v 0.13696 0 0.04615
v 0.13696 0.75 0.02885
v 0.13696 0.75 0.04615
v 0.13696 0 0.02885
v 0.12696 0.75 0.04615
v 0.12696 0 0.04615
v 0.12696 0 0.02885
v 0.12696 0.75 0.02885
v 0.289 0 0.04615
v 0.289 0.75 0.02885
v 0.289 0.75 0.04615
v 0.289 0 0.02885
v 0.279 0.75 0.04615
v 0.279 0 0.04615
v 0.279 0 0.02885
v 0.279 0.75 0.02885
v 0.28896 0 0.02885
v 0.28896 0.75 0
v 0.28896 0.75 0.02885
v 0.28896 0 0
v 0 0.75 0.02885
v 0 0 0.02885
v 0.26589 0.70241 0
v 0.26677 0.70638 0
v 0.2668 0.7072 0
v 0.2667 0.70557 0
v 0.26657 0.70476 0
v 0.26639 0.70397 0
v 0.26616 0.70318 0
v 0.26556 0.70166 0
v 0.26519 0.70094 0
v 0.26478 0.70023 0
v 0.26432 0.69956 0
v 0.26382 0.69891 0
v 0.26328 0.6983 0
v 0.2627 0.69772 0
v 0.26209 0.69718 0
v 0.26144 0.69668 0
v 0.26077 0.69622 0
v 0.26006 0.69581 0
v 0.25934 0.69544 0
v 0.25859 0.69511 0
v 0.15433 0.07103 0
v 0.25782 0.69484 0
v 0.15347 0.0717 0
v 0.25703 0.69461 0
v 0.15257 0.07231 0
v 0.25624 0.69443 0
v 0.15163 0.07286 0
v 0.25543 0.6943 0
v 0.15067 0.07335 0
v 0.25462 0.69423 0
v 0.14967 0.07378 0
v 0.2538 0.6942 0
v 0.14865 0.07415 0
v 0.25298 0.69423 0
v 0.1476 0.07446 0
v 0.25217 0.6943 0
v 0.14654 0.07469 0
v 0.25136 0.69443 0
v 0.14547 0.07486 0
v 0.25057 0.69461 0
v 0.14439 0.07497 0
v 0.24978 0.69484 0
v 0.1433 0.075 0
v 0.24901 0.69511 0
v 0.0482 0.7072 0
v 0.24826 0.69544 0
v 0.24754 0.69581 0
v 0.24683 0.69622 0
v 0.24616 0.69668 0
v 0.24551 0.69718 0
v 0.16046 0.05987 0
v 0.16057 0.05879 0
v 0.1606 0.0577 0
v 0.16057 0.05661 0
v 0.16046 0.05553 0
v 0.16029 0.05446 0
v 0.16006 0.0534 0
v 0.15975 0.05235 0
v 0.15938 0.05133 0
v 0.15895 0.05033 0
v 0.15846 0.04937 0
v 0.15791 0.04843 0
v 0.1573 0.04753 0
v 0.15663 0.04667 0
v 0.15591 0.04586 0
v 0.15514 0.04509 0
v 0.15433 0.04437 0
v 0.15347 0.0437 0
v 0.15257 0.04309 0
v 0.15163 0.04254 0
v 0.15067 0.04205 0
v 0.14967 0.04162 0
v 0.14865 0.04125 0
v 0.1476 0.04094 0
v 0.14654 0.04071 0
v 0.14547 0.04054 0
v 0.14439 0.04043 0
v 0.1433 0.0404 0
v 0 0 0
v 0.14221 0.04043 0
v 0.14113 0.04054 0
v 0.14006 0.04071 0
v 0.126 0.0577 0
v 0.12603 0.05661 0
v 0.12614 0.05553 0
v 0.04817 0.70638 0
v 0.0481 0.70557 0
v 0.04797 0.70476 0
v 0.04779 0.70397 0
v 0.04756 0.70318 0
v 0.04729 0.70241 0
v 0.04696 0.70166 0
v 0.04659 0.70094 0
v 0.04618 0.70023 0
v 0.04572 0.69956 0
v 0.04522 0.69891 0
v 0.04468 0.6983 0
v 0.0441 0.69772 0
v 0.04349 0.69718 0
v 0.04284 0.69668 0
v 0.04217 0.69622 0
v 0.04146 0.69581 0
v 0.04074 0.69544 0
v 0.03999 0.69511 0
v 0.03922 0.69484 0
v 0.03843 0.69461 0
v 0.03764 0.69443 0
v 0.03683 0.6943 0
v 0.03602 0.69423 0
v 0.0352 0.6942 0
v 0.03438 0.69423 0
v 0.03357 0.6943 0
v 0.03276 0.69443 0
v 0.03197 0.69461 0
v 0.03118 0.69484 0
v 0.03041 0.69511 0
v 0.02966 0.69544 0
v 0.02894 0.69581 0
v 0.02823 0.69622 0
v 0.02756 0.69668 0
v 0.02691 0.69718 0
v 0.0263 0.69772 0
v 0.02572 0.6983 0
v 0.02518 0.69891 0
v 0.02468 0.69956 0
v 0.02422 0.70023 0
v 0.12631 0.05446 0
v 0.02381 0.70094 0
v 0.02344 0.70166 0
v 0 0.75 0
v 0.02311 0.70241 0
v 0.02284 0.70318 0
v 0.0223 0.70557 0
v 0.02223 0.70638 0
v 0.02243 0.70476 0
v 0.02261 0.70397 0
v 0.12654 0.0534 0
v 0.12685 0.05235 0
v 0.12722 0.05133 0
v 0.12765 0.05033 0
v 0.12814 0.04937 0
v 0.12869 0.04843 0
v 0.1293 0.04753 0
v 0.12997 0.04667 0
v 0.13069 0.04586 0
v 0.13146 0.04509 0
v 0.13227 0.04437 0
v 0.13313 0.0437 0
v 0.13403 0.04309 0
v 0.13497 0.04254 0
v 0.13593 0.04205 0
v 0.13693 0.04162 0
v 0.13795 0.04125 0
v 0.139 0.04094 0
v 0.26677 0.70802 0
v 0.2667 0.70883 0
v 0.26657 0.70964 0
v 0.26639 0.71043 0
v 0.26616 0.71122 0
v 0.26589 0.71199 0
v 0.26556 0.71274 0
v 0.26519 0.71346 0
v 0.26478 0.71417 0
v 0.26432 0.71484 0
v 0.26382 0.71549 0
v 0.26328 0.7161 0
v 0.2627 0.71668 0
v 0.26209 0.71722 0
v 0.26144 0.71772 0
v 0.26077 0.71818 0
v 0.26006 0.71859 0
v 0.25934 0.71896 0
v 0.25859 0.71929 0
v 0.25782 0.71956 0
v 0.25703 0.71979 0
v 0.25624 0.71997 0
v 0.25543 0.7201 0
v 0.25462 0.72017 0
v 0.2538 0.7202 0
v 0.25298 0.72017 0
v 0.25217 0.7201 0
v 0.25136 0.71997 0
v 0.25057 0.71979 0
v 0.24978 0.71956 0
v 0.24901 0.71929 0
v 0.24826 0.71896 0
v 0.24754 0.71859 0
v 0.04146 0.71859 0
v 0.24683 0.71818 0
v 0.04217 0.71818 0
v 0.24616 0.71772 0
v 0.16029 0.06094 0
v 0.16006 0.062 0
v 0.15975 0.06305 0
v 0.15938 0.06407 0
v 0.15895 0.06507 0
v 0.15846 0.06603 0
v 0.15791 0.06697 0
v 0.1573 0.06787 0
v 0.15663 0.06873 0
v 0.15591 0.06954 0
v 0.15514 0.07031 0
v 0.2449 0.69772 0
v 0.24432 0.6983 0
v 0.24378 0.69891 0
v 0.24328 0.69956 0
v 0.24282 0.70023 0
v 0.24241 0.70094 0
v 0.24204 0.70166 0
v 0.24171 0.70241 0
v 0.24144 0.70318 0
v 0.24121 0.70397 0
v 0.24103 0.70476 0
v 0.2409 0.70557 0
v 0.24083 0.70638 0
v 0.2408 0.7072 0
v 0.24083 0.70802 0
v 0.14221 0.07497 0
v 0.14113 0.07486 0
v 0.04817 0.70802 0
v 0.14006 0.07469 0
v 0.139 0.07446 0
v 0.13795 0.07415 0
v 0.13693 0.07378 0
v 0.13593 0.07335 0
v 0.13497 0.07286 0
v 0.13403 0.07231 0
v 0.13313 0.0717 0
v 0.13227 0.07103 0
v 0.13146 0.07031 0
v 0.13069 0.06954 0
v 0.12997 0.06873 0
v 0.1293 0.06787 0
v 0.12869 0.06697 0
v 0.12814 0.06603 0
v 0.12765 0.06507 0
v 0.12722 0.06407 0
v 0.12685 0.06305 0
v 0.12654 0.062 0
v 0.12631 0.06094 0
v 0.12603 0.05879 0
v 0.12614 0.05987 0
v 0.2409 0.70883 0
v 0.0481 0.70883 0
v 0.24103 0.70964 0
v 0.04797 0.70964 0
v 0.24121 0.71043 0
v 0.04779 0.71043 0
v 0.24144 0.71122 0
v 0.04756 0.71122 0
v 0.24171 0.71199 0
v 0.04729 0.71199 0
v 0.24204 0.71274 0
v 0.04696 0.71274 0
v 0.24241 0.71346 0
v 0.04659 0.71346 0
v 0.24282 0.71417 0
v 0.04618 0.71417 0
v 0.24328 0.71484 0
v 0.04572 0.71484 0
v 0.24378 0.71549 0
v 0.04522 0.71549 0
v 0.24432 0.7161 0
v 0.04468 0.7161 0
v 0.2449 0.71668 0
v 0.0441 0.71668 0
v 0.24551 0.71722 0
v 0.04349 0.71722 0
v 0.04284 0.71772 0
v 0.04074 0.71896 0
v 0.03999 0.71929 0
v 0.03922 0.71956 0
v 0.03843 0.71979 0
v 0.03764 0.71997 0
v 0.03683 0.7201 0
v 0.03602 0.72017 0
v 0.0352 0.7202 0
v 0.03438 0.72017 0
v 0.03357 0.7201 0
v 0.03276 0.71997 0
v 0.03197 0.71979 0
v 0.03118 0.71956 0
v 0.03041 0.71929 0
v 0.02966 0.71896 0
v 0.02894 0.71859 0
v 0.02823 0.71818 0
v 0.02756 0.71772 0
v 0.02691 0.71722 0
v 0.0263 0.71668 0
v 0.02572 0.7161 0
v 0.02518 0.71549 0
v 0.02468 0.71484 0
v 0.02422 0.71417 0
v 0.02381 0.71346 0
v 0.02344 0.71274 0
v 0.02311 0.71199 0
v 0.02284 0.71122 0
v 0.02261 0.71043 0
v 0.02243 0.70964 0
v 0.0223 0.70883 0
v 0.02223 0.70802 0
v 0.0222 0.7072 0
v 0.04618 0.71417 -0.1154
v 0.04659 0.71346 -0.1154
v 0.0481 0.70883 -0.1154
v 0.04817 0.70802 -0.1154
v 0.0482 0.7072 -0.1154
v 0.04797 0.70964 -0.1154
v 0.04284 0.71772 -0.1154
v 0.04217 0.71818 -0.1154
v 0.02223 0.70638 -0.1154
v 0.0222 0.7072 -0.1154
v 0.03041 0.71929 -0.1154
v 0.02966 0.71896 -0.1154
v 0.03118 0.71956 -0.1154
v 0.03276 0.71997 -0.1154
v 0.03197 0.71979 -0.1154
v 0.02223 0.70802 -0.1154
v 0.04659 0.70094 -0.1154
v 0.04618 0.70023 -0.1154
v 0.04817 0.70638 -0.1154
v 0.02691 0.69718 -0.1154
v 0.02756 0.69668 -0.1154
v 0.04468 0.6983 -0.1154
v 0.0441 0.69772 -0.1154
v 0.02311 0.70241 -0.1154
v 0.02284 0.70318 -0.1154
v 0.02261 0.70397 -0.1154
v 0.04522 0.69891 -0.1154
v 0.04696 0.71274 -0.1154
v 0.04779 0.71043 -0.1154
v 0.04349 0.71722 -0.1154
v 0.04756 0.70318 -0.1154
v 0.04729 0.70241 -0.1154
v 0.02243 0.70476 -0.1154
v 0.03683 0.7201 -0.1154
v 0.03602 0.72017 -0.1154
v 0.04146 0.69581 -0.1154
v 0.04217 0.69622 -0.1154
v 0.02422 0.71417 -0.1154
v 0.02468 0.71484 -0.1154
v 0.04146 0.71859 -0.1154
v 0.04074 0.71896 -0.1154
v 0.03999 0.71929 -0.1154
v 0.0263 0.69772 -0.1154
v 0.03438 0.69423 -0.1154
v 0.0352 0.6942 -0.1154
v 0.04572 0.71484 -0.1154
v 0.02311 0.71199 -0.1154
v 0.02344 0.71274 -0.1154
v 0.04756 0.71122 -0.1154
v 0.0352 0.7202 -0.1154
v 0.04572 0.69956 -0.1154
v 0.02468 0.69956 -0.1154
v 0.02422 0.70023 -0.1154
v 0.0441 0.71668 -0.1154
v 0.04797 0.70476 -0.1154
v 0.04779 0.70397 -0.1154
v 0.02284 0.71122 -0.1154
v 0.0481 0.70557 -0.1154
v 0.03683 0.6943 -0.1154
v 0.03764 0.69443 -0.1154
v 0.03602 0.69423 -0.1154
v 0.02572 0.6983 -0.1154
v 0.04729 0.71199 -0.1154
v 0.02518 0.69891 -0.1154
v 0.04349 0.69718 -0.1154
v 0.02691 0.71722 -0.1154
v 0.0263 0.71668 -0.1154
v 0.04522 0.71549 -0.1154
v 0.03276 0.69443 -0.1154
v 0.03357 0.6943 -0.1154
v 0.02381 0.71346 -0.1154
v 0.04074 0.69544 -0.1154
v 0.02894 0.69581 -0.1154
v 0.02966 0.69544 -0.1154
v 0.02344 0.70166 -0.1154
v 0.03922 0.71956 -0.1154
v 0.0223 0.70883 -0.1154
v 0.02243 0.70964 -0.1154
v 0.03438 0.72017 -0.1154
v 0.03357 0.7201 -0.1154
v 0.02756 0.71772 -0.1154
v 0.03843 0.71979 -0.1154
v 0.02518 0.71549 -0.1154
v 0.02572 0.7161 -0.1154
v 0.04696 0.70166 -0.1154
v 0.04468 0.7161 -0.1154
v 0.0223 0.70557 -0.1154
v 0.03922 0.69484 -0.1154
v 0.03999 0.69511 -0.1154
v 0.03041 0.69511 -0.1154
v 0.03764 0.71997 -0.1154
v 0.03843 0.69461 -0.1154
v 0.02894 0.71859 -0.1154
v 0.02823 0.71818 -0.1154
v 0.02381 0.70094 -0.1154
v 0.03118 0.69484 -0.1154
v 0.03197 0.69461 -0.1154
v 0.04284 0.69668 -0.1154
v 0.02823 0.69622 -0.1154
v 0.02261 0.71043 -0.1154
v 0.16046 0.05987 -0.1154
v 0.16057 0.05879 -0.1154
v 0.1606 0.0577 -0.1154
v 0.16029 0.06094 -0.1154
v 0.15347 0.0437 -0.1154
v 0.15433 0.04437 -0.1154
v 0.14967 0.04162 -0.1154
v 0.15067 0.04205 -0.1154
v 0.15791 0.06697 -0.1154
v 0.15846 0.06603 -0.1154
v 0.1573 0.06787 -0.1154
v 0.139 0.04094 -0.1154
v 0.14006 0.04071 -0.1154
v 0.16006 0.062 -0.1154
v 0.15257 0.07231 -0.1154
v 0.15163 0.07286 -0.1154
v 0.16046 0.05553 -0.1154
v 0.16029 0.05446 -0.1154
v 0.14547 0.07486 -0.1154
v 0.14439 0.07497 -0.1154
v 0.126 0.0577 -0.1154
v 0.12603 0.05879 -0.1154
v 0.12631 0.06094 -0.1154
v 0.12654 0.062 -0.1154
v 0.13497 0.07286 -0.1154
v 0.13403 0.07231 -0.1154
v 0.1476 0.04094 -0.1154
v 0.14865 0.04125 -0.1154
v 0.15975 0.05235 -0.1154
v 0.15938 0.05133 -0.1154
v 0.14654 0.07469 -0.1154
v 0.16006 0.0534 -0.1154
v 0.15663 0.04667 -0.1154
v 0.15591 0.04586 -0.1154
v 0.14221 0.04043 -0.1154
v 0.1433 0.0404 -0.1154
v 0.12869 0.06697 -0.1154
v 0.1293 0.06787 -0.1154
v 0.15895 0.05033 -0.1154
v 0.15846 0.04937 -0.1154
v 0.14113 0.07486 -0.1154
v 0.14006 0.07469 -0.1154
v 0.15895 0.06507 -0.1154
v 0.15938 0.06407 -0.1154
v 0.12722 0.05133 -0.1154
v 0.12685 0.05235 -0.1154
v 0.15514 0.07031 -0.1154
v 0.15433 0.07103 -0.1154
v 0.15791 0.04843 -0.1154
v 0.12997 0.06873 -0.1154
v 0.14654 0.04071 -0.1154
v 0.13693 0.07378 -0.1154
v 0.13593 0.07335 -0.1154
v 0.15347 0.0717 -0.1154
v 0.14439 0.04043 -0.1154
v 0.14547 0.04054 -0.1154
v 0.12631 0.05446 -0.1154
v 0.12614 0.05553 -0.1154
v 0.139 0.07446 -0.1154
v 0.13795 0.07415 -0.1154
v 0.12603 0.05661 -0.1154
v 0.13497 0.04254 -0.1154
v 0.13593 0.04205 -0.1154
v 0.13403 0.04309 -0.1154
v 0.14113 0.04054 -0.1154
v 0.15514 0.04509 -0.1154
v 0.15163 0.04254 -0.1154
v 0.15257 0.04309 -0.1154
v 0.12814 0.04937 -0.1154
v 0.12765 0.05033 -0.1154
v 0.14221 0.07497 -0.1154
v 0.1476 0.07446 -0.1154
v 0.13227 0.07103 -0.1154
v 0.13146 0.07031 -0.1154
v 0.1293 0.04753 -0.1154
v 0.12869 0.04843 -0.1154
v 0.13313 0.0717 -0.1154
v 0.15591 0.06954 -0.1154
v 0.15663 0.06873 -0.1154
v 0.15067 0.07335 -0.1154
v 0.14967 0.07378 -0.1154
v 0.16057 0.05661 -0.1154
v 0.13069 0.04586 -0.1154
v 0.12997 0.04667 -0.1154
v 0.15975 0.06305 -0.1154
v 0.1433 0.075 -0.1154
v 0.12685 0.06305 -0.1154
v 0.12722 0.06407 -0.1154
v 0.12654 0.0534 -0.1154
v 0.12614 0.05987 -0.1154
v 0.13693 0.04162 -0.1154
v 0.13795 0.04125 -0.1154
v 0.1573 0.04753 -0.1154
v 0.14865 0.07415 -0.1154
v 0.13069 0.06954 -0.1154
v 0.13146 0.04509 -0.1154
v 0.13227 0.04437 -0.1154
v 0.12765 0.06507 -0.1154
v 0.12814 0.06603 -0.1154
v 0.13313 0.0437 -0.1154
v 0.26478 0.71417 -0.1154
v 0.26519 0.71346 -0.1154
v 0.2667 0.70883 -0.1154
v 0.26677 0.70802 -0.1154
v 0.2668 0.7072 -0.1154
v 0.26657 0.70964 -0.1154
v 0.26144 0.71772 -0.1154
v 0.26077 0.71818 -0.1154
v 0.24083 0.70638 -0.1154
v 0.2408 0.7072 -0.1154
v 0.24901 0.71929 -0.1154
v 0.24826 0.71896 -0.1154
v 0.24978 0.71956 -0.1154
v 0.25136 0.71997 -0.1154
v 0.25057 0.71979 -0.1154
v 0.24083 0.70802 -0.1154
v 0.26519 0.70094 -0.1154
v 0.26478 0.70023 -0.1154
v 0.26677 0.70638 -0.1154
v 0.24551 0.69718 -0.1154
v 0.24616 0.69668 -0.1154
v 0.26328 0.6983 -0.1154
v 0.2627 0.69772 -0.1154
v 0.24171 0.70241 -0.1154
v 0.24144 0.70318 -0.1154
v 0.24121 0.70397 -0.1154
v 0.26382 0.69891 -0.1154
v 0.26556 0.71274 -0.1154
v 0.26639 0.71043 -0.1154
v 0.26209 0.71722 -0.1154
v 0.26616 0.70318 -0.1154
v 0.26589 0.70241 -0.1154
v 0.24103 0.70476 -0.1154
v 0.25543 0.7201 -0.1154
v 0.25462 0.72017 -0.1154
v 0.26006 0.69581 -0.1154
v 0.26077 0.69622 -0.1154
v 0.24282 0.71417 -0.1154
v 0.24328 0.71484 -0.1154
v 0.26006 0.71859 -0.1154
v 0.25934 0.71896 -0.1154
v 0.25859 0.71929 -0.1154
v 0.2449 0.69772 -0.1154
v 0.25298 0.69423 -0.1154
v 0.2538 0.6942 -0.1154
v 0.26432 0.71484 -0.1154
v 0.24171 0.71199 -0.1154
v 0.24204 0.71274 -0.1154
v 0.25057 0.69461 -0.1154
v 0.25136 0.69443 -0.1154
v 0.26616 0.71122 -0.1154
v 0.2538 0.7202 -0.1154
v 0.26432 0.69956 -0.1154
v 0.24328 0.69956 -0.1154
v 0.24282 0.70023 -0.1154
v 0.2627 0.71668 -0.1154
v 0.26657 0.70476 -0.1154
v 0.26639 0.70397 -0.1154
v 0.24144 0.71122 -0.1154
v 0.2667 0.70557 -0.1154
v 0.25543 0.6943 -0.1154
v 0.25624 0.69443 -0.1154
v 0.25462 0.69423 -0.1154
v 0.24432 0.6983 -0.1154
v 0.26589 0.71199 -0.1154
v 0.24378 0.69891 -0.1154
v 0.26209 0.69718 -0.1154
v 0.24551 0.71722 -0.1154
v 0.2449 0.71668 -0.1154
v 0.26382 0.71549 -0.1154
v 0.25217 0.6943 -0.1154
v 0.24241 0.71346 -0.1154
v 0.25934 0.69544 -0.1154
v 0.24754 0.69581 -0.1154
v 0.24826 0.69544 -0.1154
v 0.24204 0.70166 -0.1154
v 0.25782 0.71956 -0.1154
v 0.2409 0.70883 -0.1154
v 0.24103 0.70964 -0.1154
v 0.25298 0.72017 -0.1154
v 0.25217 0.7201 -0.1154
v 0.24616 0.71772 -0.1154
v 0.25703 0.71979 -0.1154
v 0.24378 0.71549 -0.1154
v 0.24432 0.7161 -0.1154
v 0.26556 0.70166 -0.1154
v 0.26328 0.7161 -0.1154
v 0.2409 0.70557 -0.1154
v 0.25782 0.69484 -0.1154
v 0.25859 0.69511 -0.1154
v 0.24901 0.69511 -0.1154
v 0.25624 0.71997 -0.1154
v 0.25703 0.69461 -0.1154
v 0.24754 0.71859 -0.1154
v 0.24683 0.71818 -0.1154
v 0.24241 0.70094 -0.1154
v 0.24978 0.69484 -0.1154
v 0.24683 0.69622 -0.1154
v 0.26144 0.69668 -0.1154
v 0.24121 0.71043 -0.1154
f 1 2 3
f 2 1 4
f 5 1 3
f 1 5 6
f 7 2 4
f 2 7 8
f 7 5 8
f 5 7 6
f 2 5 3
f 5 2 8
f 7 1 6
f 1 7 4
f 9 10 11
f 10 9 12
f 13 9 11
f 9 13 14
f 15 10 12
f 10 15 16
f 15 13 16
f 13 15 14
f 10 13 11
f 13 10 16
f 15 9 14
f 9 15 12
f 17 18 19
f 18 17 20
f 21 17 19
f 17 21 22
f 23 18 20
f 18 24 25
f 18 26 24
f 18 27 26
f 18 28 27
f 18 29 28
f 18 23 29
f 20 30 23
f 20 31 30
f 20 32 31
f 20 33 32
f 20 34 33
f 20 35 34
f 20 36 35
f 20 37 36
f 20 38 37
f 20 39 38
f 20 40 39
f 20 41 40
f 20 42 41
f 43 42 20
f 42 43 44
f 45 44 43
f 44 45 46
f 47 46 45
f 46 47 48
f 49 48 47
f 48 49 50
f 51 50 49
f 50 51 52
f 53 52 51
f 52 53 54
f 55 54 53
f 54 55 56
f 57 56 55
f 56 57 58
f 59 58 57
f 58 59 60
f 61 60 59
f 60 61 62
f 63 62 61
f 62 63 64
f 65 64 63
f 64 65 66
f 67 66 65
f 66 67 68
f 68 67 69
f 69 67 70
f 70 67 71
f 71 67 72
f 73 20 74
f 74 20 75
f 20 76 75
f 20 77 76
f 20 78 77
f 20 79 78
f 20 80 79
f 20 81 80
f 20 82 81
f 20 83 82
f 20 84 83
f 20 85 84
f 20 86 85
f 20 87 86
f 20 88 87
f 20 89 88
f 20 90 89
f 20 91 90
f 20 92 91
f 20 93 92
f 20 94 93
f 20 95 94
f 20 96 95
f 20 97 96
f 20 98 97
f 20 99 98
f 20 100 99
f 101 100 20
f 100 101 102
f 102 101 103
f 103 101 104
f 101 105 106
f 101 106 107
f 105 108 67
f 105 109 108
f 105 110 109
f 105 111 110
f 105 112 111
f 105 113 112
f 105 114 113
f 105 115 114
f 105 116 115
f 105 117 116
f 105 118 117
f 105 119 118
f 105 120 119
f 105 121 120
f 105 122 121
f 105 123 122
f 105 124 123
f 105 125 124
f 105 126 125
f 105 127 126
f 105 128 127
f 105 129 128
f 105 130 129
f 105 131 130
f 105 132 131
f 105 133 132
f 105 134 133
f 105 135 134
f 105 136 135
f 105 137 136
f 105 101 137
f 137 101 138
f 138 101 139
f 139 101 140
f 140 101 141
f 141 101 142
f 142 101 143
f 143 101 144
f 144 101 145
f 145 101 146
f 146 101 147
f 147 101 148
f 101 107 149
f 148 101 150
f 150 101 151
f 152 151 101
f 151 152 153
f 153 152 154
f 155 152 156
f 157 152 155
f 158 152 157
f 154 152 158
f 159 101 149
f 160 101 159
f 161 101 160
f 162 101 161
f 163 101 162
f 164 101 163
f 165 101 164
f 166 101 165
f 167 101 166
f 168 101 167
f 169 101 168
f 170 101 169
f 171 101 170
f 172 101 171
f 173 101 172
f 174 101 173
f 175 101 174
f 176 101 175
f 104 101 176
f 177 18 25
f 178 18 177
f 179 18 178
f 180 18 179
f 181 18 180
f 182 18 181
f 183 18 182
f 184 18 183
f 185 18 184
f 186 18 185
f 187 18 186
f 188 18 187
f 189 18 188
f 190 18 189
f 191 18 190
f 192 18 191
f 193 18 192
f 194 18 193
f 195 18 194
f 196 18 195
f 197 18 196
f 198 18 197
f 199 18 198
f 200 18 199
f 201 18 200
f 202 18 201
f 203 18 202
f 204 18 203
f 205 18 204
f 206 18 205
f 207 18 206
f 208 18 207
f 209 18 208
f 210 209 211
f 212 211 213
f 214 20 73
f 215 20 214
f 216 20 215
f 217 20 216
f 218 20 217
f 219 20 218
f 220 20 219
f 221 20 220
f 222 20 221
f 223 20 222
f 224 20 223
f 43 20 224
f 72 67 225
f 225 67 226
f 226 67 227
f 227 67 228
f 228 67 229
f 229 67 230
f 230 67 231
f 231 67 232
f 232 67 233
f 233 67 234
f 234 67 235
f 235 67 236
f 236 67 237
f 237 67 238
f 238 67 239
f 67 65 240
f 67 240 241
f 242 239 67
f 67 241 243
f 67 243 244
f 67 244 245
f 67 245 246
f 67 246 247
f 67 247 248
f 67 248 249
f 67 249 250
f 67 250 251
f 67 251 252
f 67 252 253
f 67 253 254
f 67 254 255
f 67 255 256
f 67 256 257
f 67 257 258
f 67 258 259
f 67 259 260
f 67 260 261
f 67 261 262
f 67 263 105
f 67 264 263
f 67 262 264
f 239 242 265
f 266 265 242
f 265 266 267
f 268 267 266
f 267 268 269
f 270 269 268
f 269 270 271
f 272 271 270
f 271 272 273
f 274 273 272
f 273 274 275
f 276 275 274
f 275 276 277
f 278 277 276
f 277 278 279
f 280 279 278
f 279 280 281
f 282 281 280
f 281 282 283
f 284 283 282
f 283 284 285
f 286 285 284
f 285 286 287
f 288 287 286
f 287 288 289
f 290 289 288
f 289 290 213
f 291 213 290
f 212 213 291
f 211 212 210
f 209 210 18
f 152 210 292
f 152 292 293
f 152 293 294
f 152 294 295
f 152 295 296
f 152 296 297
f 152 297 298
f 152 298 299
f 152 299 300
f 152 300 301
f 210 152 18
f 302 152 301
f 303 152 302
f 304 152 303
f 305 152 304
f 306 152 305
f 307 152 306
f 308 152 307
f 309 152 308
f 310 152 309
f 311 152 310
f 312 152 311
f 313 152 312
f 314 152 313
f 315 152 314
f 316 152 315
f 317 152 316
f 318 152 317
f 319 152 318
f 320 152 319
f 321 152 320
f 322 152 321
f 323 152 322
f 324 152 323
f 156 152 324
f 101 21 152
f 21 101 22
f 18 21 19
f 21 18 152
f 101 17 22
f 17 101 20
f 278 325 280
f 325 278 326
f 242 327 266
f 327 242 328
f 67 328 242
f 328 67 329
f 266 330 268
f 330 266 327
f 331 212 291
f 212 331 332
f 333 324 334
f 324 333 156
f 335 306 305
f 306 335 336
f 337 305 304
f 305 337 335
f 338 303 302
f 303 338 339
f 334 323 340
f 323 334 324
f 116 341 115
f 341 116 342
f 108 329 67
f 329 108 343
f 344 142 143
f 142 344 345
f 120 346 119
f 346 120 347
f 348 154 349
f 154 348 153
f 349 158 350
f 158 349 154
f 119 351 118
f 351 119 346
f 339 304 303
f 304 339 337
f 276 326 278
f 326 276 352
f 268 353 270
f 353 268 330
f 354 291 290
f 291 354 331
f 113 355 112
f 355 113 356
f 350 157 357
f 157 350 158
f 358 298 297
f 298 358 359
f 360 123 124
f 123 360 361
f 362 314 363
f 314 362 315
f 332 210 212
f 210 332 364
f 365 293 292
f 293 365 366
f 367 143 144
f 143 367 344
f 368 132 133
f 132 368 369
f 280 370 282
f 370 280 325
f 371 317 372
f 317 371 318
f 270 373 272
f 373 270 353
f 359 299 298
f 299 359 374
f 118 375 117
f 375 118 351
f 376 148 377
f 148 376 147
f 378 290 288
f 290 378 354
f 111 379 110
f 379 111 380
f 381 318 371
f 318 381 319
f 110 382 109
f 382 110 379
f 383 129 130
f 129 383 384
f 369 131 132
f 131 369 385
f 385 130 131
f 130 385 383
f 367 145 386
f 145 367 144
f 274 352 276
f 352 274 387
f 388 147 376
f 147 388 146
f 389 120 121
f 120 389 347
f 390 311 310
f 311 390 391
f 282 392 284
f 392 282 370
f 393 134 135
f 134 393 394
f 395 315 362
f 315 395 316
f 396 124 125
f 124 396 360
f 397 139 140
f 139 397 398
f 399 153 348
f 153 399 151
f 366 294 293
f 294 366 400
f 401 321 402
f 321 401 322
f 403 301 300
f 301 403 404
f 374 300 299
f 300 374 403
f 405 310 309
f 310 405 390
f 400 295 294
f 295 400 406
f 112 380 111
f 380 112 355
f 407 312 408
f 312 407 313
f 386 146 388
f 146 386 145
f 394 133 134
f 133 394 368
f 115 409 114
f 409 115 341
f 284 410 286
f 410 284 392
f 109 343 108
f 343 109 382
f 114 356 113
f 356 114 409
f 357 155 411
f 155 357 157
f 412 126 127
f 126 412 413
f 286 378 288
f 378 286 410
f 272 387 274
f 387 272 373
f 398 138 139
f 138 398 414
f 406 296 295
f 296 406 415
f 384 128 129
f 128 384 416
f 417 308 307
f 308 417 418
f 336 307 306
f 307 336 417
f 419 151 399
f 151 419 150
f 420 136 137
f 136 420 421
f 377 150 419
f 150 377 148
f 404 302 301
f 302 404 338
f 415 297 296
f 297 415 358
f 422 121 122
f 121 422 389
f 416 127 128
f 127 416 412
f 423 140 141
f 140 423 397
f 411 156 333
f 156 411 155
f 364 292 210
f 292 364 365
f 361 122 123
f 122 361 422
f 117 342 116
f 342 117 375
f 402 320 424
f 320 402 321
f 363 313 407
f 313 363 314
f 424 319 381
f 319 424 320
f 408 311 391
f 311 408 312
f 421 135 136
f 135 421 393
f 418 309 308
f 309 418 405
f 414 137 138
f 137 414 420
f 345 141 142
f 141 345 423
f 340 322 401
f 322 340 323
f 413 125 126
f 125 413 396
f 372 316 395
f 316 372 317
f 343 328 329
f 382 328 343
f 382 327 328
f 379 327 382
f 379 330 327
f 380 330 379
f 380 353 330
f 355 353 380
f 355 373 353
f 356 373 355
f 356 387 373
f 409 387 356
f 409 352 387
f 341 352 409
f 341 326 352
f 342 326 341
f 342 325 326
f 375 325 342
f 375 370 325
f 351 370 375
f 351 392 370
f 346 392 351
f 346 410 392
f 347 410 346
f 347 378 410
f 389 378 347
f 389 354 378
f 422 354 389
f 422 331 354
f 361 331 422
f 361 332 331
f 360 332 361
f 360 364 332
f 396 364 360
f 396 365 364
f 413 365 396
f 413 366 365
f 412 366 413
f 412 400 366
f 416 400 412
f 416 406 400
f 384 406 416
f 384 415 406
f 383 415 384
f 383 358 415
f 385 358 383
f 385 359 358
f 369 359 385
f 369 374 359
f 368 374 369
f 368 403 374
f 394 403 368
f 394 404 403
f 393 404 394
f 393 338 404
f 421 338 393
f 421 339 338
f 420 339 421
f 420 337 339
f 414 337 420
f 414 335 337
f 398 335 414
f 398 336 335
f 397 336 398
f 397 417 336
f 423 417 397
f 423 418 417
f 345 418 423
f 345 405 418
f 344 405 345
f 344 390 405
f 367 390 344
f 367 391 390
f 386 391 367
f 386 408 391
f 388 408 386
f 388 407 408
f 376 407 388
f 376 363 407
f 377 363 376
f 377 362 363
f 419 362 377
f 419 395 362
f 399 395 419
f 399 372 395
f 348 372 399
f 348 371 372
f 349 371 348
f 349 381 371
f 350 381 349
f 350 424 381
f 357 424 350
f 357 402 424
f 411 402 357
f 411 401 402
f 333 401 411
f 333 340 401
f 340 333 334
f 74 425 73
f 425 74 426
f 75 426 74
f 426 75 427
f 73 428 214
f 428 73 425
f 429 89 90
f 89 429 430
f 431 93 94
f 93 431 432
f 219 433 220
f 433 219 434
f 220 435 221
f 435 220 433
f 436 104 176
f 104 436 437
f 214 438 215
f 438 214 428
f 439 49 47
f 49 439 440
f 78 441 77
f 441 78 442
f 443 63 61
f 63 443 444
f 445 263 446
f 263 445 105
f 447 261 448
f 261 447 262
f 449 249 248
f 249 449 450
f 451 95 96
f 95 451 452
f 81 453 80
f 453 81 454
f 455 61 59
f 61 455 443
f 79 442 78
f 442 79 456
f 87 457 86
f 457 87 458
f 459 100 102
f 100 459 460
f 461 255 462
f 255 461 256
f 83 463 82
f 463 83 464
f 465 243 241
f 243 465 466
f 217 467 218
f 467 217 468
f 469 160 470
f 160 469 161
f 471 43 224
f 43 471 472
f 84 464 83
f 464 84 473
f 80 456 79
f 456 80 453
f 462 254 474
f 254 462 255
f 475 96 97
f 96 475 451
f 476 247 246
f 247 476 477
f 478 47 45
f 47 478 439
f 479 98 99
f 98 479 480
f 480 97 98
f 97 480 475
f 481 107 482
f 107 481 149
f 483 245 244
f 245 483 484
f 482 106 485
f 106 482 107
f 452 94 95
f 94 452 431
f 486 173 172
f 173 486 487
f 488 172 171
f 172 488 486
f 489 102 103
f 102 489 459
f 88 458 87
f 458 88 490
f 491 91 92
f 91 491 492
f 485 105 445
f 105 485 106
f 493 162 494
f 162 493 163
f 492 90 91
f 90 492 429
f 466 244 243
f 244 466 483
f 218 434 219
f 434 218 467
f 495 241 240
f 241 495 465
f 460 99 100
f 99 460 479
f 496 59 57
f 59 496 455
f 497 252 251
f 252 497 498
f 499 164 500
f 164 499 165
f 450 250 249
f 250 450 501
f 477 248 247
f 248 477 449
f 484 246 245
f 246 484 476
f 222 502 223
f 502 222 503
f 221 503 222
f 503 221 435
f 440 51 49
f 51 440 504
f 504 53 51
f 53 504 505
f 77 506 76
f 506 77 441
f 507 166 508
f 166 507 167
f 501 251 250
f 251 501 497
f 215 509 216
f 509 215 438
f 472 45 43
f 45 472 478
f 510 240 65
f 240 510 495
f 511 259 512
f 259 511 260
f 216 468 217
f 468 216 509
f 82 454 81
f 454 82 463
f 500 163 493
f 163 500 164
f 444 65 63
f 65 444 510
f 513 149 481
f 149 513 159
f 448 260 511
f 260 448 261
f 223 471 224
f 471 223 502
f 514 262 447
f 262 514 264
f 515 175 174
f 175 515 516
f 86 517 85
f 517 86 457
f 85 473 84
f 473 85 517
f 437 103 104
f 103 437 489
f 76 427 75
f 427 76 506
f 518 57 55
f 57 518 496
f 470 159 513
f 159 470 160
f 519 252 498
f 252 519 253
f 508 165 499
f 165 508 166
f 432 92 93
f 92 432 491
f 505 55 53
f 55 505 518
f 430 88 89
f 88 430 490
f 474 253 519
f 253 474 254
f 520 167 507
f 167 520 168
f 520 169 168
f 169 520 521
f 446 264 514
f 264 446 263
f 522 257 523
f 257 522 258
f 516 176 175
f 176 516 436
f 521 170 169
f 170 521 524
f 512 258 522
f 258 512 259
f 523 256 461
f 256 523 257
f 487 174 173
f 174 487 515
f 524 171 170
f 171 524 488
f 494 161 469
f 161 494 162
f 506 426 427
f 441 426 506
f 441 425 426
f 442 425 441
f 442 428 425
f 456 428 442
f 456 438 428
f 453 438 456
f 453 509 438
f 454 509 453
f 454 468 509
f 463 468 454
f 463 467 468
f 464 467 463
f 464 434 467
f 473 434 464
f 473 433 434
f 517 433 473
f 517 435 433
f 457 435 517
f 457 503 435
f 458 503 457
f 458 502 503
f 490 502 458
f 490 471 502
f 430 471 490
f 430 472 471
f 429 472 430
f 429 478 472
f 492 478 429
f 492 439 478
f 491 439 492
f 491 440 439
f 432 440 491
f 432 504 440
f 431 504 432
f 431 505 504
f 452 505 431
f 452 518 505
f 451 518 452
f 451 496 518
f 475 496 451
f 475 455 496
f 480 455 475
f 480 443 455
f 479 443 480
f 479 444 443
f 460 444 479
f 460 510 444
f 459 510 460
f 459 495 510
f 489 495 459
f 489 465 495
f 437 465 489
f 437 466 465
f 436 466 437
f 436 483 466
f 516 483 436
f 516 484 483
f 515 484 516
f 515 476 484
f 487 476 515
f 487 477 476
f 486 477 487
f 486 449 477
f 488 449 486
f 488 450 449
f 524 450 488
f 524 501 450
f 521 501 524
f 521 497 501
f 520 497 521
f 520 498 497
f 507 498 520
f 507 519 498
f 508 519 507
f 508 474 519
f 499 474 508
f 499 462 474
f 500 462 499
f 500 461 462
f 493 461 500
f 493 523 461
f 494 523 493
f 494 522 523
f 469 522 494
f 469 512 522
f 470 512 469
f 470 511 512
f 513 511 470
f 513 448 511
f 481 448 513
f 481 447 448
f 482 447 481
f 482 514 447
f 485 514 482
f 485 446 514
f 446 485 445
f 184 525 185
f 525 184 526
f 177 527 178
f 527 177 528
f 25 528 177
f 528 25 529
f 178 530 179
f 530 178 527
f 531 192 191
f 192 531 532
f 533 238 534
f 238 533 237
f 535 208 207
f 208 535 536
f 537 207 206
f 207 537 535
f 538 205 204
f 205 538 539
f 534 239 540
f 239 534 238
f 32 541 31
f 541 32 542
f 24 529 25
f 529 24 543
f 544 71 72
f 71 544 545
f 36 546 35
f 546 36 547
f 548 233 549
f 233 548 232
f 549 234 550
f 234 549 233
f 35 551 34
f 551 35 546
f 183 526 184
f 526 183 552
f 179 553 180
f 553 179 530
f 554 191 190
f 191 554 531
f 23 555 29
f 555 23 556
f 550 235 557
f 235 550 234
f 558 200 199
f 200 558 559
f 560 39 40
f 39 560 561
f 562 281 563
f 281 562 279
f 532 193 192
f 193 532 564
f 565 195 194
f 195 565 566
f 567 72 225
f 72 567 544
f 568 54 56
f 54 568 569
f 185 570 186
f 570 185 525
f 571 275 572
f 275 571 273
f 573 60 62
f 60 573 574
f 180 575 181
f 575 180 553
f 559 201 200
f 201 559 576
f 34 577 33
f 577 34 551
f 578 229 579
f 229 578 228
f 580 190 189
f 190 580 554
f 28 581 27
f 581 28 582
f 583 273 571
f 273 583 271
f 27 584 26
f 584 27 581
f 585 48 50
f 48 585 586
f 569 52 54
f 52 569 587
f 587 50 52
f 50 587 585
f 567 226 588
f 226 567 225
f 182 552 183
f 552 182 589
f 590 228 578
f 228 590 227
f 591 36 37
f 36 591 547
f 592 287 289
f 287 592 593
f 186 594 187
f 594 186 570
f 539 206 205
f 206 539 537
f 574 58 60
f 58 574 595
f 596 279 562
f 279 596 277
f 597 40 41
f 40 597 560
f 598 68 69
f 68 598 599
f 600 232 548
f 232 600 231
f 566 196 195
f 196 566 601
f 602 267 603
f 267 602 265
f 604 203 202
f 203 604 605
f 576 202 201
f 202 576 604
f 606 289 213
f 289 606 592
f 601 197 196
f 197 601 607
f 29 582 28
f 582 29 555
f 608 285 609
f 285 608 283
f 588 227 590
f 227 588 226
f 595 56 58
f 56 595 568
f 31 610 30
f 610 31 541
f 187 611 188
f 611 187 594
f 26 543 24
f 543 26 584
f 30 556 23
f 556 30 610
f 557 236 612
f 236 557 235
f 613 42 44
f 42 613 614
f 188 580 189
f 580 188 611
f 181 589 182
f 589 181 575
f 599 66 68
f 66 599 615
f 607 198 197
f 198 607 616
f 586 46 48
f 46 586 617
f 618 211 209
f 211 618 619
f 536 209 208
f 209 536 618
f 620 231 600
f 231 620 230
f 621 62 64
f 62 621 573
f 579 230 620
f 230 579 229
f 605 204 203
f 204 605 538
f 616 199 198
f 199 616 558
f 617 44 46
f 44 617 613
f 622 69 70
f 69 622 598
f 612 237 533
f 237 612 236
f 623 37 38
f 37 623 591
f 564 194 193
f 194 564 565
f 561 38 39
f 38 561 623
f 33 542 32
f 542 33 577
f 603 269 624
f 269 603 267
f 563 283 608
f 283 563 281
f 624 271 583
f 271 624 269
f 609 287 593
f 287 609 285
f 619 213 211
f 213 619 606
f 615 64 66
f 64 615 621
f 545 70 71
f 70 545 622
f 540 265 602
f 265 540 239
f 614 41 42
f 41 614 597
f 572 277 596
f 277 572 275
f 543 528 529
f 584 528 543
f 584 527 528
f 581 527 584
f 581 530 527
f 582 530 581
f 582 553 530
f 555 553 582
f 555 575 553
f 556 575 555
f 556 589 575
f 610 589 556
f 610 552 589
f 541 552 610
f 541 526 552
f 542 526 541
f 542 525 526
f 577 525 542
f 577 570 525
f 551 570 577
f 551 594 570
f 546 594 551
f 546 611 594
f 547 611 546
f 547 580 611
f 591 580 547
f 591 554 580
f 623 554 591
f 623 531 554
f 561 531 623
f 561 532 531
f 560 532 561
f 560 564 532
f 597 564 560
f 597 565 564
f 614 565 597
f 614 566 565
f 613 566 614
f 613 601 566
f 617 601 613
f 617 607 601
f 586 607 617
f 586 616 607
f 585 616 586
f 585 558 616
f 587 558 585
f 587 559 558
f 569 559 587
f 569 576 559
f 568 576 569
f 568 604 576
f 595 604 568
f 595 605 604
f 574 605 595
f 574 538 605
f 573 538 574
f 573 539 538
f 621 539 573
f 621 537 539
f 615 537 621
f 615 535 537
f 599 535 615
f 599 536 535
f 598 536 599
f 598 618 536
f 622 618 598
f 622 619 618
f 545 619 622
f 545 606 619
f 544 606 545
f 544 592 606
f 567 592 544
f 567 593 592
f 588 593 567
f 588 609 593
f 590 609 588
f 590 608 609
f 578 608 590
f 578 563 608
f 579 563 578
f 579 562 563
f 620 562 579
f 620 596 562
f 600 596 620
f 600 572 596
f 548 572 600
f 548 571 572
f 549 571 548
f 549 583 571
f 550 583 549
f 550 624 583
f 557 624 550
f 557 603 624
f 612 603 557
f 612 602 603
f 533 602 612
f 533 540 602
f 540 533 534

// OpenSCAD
// Parametric model of base with ribs and stepped circular recesses

// === Parameters ===
// Base dimensions
base_length = 0.28896;
base_width = 0.75;
base_height = 0.028846;
extrusion_depth = 0.0288;

// Rib parameters
rib_footprint_length = 0.162037;
rib_footprint_width = 0.75;
rib_edge_offset = 0.0635;
rib_height = 0.017308;
rib_extrusion = 0.0173;
rib_thickness = 0.01; // Assumed thickness for two separate ribs

// Circular recess parameters
// Format: [left_offset, front_offset, radius]
circles = [
    [0.0352, 0.7072, 0.013],
    [0.1433, 0.0577, 0.0173],
    [0.2538, 0.7072, 0.013]
];

// Recess stage parameters
upper_recess_start = 0.0057;
upper_recess_end = 0.0288;
upper_recess_depth = 0.0231;

// Deeper cut parameters
deep_cut_top = 0.0288;
deep_cut_bottom = -0.1154;
deep_cut_depth = 0.1442;

$fn = 100; // Smooth circular features

// === Modules ===
// Base rectangular solid
module base() {
    cube([base_length, base_width, base_height]);
}

// Single rib (lengthwise, full width)
module rib() {
    cube([rib_thickness, rib_footprint_width, rib_height]);
}

// Upper circular recess (shallow)
module upper_recess(radius) {
    cylinder(h = upper_recess_depth, r = radius);
}

// Deeper circular cut (passes through base)
module deep_cut(radius) {
    cylinder(h = deep_cut_depth, r = radius);
}

// === Main Model ===
union() {
    // Create base
    base();
    
    // Add two separate ribs centered on base
    translate([(base_length - rib_footprint_length)/2 + rib_edge_offset, 0, base_height]) {
        // Left rib
        rib();
        // Right rib (separated by gap)
        translate([rib_footprint_length - rib_thickness, 0, 0]) {
            rib();
        }
    }
}

// Apply circular removed features
difference() {
    // Base with ribs (from above union)
    children(0);
    
    // Create three stepped circular recesses
    for (circle = circles) {
        left_off = circle[0];
        front_off = circle[1];
        radius = circle[2];
        
        // Position relative to base origin
        translate([left_off, front_off, 0]) {
            // Upper recess (stops above base bottom)
            translate([0, 0, upper_recess_start]) {
                upper_recess(radius);
            }
            
            // Deeper cut (extends beyond base bottom)
            translate([0, 0, deep_cut_bottom]) {
                deep_cut(radius);
            }
        }
    }
}
